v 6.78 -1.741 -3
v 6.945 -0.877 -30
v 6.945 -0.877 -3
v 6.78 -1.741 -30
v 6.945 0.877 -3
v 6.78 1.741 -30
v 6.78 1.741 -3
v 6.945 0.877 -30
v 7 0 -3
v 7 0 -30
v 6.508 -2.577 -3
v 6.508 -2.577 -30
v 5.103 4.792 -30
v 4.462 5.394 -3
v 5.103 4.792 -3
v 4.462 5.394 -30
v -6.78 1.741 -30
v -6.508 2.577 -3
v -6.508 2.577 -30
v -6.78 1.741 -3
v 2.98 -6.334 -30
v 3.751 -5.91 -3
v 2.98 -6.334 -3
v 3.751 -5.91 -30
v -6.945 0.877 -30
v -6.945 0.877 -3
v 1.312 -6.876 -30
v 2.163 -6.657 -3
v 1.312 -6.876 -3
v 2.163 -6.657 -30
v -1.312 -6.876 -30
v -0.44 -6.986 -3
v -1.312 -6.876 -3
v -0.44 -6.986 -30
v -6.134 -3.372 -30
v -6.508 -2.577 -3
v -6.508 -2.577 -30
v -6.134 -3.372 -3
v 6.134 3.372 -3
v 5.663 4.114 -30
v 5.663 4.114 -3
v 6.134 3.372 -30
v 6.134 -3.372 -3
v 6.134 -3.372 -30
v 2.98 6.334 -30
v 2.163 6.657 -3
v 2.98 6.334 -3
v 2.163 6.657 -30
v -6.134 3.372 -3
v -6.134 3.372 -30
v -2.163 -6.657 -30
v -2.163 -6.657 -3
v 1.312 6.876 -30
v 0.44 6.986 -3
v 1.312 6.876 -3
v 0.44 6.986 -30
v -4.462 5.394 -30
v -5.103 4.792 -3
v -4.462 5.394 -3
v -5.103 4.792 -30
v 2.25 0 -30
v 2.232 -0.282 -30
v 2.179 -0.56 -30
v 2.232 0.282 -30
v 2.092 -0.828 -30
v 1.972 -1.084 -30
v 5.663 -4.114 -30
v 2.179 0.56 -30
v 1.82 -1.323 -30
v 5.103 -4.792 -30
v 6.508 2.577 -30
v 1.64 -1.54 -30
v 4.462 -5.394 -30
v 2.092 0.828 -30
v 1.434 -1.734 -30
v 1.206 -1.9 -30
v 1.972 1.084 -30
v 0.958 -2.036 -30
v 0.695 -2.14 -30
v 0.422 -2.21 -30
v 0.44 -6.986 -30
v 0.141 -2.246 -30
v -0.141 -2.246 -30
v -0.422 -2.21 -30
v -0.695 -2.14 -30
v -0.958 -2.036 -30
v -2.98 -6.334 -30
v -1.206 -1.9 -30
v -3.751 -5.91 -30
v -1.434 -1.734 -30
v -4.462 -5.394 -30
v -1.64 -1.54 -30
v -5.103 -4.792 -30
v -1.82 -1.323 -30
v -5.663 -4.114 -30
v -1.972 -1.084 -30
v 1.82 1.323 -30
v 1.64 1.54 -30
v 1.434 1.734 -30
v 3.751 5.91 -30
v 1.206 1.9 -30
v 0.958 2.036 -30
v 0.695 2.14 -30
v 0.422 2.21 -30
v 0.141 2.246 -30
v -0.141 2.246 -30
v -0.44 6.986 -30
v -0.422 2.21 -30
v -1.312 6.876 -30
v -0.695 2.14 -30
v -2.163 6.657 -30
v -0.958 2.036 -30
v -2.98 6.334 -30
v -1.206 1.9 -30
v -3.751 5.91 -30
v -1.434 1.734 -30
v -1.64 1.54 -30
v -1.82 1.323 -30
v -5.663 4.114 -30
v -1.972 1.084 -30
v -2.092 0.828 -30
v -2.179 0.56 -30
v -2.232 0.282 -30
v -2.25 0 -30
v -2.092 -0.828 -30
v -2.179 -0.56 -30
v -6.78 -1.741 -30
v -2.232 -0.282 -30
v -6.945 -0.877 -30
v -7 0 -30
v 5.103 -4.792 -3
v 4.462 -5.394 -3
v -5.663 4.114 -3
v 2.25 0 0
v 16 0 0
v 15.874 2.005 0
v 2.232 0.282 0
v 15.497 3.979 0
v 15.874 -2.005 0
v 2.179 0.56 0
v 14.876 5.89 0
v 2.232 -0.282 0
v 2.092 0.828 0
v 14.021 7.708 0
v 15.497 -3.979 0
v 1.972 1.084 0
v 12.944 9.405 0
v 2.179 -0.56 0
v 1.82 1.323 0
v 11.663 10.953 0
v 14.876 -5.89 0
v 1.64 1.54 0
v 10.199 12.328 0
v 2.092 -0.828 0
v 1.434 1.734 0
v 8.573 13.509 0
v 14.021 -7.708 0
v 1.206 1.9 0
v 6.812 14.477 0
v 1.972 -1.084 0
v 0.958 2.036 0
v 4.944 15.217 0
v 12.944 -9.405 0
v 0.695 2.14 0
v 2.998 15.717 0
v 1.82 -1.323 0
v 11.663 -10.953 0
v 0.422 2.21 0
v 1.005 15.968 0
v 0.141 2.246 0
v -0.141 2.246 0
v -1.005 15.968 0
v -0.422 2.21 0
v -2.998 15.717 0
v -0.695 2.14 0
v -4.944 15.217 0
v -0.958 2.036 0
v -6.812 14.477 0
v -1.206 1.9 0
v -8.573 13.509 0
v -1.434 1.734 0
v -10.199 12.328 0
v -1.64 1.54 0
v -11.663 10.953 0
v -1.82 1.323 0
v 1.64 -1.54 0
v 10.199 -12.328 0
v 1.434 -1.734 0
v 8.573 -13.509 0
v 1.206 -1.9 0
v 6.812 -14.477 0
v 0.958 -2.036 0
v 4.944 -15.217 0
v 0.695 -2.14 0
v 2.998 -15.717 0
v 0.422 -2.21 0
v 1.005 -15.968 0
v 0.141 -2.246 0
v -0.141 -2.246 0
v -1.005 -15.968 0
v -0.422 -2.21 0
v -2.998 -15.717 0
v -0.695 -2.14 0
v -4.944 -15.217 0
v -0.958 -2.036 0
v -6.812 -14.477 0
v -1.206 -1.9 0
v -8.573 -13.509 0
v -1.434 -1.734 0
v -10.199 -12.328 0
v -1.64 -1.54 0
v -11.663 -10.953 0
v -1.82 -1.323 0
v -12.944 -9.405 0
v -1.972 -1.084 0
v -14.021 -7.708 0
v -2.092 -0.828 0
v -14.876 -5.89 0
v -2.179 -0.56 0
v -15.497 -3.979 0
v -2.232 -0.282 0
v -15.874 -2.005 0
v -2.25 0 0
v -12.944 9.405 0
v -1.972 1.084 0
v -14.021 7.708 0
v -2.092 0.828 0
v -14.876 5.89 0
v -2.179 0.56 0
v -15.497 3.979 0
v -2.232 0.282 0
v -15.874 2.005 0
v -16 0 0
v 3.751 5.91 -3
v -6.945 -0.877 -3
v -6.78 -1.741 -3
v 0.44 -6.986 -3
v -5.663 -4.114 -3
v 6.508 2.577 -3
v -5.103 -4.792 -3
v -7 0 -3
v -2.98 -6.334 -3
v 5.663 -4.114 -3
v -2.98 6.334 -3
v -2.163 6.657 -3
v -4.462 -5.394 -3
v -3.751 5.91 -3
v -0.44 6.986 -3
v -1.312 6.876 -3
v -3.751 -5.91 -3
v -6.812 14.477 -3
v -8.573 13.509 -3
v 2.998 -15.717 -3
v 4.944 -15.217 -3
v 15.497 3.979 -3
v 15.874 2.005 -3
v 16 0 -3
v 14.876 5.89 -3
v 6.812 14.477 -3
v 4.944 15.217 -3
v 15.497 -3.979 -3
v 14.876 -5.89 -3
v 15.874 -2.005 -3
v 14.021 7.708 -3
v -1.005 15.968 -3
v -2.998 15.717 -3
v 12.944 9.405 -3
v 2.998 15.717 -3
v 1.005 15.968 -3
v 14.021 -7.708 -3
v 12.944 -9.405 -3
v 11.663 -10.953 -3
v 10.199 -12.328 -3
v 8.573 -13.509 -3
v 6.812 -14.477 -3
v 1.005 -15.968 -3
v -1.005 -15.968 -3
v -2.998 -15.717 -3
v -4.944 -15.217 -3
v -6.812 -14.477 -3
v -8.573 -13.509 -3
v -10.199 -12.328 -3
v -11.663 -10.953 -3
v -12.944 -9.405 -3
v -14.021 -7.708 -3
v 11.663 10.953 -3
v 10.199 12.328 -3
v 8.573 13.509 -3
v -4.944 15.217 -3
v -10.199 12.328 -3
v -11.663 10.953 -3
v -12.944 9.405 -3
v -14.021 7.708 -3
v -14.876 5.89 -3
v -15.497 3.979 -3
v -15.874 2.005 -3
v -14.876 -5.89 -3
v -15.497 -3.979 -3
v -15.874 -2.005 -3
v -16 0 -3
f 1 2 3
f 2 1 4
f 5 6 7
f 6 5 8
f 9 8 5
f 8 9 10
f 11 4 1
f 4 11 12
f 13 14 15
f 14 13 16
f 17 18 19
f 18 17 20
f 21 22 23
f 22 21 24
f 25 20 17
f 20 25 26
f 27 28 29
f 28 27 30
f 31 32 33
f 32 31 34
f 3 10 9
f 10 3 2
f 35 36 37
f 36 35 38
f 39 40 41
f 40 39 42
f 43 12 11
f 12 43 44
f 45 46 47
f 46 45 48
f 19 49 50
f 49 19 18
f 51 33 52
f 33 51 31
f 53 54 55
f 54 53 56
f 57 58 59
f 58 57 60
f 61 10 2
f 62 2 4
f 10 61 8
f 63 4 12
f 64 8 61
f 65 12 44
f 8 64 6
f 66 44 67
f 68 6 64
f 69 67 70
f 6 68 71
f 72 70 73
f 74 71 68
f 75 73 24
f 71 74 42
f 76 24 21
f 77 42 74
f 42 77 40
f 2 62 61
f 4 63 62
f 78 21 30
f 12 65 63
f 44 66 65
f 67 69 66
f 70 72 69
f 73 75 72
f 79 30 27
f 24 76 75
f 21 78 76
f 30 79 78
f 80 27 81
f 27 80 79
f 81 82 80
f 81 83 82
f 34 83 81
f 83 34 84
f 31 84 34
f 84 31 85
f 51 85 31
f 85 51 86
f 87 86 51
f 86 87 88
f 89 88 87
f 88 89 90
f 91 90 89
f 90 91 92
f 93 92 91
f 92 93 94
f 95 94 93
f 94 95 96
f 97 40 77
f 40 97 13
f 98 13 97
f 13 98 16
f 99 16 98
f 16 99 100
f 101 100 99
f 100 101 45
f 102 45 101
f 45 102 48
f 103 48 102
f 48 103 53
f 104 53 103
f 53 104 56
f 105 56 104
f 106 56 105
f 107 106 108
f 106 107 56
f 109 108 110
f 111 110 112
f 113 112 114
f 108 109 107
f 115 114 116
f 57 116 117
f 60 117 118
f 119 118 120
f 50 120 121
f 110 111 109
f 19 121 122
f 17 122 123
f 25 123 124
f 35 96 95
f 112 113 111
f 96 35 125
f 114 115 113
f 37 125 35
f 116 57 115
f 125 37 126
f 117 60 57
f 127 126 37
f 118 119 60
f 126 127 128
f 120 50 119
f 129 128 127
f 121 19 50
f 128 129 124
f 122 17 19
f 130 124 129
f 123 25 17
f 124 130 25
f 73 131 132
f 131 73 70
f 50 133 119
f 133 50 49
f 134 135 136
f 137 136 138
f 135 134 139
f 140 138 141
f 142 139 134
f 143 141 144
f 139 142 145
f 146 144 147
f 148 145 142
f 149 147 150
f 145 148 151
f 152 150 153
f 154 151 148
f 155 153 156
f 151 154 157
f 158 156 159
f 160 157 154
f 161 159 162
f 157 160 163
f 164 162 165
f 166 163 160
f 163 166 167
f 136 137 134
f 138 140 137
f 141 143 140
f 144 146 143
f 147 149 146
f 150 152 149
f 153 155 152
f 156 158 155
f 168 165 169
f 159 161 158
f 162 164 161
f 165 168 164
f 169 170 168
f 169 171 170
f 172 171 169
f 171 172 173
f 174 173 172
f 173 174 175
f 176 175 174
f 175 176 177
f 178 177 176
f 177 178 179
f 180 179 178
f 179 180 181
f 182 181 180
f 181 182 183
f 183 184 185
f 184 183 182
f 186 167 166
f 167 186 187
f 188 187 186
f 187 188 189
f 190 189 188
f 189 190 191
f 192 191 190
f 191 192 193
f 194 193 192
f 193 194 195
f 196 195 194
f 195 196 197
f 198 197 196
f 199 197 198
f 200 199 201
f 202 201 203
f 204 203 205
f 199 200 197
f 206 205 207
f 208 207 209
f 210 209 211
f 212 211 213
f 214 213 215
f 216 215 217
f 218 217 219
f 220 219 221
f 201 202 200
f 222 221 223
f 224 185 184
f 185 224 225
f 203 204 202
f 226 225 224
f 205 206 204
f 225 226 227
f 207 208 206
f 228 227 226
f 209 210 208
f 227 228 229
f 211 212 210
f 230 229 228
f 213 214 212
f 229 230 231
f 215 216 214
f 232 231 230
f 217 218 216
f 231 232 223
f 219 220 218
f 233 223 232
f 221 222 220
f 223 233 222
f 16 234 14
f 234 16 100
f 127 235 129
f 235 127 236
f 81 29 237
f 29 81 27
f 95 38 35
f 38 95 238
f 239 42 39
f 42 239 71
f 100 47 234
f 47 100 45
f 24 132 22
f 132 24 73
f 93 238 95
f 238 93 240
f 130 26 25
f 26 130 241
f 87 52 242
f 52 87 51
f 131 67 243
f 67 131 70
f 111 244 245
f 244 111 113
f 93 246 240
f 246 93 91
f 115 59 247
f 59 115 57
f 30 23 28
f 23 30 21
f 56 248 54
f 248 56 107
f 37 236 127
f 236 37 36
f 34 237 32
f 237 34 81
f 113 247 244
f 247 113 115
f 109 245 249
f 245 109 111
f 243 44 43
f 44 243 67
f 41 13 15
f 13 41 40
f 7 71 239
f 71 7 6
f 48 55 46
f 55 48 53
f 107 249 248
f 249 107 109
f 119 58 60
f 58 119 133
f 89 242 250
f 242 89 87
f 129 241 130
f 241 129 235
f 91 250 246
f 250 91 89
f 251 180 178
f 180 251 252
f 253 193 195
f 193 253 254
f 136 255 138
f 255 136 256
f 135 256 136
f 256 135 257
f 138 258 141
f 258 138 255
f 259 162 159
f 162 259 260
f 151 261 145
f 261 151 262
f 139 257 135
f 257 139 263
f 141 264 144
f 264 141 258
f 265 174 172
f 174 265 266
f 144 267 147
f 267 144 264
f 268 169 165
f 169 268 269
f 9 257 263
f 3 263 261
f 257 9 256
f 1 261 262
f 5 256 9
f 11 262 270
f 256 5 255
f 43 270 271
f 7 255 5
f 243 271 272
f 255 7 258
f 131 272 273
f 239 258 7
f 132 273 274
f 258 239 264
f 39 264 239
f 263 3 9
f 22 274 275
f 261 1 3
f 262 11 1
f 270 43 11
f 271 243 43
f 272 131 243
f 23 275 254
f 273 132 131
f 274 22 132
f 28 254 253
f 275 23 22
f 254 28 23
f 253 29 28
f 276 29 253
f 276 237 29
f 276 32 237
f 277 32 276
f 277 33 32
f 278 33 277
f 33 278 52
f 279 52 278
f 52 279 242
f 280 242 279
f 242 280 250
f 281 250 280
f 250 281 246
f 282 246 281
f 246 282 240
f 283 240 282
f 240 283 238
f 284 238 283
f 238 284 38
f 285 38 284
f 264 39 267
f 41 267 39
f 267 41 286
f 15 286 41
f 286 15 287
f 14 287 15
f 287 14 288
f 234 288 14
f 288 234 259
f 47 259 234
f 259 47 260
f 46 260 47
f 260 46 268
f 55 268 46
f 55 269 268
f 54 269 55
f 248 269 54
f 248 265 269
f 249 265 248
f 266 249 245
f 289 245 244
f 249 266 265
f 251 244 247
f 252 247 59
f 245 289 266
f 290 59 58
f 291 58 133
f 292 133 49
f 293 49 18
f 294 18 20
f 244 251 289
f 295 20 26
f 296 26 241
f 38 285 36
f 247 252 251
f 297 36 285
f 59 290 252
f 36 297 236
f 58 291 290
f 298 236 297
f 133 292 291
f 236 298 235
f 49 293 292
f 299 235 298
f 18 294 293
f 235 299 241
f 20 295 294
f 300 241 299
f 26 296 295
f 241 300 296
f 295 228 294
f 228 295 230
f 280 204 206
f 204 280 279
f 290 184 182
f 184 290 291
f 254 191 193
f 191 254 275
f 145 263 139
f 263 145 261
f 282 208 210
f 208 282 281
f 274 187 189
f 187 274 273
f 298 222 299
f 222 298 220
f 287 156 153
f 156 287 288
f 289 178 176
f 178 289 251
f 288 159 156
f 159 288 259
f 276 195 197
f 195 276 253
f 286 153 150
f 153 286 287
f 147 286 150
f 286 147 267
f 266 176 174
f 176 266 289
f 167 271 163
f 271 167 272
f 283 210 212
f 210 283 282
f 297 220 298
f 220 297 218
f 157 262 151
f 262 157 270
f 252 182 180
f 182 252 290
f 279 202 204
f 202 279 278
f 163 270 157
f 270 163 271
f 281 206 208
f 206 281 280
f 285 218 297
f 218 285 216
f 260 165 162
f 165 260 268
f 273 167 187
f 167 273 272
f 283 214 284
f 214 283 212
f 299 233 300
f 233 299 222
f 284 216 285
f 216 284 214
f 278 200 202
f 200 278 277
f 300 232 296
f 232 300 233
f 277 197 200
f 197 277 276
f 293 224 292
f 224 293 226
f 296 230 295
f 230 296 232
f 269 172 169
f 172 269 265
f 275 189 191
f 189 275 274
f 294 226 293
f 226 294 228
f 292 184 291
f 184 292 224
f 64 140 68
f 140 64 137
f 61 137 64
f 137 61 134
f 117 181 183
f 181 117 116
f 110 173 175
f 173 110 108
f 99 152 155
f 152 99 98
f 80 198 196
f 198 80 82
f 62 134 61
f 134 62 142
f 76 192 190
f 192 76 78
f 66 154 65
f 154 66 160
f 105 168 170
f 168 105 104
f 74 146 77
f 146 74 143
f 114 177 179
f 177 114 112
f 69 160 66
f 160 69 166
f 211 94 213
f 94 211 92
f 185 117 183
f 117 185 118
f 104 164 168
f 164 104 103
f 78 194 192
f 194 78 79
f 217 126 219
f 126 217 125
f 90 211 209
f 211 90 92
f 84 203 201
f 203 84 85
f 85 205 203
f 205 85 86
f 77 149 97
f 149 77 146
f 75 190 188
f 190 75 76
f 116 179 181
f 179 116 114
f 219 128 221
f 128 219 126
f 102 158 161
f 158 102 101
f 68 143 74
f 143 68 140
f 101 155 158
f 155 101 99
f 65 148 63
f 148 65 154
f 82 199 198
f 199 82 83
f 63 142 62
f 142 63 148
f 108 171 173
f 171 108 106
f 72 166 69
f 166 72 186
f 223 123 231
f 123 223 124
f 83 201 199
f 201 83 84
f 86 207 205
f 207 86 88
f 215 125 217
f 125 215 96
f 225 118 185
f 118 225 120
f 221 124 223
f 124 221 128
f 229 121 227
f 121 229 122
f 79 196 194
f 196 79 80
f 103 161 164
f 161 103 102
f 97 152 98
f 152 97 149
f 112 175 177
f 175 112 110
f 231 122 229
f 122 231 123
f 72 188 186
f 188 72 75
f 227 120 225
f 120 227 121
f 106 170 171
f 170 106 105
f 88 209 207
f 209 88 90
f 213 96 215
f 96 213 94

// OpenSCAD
$fn = 50;


difference() {
	union() {
		translate(v = [0, 0, -30.0000000000]) {
			cylinder(h = 30, r = 7.0000000000);
		}
		translate(v = [0, 0, -3.0000000000]) {
			cylinder(h = 3, r = 16.0000000000);
		}
	}
	union() {
		#translate(v = [0, 0, -30]) {
			cylinder(h = 30, r = 2.2500000000);
		}
	}
}
